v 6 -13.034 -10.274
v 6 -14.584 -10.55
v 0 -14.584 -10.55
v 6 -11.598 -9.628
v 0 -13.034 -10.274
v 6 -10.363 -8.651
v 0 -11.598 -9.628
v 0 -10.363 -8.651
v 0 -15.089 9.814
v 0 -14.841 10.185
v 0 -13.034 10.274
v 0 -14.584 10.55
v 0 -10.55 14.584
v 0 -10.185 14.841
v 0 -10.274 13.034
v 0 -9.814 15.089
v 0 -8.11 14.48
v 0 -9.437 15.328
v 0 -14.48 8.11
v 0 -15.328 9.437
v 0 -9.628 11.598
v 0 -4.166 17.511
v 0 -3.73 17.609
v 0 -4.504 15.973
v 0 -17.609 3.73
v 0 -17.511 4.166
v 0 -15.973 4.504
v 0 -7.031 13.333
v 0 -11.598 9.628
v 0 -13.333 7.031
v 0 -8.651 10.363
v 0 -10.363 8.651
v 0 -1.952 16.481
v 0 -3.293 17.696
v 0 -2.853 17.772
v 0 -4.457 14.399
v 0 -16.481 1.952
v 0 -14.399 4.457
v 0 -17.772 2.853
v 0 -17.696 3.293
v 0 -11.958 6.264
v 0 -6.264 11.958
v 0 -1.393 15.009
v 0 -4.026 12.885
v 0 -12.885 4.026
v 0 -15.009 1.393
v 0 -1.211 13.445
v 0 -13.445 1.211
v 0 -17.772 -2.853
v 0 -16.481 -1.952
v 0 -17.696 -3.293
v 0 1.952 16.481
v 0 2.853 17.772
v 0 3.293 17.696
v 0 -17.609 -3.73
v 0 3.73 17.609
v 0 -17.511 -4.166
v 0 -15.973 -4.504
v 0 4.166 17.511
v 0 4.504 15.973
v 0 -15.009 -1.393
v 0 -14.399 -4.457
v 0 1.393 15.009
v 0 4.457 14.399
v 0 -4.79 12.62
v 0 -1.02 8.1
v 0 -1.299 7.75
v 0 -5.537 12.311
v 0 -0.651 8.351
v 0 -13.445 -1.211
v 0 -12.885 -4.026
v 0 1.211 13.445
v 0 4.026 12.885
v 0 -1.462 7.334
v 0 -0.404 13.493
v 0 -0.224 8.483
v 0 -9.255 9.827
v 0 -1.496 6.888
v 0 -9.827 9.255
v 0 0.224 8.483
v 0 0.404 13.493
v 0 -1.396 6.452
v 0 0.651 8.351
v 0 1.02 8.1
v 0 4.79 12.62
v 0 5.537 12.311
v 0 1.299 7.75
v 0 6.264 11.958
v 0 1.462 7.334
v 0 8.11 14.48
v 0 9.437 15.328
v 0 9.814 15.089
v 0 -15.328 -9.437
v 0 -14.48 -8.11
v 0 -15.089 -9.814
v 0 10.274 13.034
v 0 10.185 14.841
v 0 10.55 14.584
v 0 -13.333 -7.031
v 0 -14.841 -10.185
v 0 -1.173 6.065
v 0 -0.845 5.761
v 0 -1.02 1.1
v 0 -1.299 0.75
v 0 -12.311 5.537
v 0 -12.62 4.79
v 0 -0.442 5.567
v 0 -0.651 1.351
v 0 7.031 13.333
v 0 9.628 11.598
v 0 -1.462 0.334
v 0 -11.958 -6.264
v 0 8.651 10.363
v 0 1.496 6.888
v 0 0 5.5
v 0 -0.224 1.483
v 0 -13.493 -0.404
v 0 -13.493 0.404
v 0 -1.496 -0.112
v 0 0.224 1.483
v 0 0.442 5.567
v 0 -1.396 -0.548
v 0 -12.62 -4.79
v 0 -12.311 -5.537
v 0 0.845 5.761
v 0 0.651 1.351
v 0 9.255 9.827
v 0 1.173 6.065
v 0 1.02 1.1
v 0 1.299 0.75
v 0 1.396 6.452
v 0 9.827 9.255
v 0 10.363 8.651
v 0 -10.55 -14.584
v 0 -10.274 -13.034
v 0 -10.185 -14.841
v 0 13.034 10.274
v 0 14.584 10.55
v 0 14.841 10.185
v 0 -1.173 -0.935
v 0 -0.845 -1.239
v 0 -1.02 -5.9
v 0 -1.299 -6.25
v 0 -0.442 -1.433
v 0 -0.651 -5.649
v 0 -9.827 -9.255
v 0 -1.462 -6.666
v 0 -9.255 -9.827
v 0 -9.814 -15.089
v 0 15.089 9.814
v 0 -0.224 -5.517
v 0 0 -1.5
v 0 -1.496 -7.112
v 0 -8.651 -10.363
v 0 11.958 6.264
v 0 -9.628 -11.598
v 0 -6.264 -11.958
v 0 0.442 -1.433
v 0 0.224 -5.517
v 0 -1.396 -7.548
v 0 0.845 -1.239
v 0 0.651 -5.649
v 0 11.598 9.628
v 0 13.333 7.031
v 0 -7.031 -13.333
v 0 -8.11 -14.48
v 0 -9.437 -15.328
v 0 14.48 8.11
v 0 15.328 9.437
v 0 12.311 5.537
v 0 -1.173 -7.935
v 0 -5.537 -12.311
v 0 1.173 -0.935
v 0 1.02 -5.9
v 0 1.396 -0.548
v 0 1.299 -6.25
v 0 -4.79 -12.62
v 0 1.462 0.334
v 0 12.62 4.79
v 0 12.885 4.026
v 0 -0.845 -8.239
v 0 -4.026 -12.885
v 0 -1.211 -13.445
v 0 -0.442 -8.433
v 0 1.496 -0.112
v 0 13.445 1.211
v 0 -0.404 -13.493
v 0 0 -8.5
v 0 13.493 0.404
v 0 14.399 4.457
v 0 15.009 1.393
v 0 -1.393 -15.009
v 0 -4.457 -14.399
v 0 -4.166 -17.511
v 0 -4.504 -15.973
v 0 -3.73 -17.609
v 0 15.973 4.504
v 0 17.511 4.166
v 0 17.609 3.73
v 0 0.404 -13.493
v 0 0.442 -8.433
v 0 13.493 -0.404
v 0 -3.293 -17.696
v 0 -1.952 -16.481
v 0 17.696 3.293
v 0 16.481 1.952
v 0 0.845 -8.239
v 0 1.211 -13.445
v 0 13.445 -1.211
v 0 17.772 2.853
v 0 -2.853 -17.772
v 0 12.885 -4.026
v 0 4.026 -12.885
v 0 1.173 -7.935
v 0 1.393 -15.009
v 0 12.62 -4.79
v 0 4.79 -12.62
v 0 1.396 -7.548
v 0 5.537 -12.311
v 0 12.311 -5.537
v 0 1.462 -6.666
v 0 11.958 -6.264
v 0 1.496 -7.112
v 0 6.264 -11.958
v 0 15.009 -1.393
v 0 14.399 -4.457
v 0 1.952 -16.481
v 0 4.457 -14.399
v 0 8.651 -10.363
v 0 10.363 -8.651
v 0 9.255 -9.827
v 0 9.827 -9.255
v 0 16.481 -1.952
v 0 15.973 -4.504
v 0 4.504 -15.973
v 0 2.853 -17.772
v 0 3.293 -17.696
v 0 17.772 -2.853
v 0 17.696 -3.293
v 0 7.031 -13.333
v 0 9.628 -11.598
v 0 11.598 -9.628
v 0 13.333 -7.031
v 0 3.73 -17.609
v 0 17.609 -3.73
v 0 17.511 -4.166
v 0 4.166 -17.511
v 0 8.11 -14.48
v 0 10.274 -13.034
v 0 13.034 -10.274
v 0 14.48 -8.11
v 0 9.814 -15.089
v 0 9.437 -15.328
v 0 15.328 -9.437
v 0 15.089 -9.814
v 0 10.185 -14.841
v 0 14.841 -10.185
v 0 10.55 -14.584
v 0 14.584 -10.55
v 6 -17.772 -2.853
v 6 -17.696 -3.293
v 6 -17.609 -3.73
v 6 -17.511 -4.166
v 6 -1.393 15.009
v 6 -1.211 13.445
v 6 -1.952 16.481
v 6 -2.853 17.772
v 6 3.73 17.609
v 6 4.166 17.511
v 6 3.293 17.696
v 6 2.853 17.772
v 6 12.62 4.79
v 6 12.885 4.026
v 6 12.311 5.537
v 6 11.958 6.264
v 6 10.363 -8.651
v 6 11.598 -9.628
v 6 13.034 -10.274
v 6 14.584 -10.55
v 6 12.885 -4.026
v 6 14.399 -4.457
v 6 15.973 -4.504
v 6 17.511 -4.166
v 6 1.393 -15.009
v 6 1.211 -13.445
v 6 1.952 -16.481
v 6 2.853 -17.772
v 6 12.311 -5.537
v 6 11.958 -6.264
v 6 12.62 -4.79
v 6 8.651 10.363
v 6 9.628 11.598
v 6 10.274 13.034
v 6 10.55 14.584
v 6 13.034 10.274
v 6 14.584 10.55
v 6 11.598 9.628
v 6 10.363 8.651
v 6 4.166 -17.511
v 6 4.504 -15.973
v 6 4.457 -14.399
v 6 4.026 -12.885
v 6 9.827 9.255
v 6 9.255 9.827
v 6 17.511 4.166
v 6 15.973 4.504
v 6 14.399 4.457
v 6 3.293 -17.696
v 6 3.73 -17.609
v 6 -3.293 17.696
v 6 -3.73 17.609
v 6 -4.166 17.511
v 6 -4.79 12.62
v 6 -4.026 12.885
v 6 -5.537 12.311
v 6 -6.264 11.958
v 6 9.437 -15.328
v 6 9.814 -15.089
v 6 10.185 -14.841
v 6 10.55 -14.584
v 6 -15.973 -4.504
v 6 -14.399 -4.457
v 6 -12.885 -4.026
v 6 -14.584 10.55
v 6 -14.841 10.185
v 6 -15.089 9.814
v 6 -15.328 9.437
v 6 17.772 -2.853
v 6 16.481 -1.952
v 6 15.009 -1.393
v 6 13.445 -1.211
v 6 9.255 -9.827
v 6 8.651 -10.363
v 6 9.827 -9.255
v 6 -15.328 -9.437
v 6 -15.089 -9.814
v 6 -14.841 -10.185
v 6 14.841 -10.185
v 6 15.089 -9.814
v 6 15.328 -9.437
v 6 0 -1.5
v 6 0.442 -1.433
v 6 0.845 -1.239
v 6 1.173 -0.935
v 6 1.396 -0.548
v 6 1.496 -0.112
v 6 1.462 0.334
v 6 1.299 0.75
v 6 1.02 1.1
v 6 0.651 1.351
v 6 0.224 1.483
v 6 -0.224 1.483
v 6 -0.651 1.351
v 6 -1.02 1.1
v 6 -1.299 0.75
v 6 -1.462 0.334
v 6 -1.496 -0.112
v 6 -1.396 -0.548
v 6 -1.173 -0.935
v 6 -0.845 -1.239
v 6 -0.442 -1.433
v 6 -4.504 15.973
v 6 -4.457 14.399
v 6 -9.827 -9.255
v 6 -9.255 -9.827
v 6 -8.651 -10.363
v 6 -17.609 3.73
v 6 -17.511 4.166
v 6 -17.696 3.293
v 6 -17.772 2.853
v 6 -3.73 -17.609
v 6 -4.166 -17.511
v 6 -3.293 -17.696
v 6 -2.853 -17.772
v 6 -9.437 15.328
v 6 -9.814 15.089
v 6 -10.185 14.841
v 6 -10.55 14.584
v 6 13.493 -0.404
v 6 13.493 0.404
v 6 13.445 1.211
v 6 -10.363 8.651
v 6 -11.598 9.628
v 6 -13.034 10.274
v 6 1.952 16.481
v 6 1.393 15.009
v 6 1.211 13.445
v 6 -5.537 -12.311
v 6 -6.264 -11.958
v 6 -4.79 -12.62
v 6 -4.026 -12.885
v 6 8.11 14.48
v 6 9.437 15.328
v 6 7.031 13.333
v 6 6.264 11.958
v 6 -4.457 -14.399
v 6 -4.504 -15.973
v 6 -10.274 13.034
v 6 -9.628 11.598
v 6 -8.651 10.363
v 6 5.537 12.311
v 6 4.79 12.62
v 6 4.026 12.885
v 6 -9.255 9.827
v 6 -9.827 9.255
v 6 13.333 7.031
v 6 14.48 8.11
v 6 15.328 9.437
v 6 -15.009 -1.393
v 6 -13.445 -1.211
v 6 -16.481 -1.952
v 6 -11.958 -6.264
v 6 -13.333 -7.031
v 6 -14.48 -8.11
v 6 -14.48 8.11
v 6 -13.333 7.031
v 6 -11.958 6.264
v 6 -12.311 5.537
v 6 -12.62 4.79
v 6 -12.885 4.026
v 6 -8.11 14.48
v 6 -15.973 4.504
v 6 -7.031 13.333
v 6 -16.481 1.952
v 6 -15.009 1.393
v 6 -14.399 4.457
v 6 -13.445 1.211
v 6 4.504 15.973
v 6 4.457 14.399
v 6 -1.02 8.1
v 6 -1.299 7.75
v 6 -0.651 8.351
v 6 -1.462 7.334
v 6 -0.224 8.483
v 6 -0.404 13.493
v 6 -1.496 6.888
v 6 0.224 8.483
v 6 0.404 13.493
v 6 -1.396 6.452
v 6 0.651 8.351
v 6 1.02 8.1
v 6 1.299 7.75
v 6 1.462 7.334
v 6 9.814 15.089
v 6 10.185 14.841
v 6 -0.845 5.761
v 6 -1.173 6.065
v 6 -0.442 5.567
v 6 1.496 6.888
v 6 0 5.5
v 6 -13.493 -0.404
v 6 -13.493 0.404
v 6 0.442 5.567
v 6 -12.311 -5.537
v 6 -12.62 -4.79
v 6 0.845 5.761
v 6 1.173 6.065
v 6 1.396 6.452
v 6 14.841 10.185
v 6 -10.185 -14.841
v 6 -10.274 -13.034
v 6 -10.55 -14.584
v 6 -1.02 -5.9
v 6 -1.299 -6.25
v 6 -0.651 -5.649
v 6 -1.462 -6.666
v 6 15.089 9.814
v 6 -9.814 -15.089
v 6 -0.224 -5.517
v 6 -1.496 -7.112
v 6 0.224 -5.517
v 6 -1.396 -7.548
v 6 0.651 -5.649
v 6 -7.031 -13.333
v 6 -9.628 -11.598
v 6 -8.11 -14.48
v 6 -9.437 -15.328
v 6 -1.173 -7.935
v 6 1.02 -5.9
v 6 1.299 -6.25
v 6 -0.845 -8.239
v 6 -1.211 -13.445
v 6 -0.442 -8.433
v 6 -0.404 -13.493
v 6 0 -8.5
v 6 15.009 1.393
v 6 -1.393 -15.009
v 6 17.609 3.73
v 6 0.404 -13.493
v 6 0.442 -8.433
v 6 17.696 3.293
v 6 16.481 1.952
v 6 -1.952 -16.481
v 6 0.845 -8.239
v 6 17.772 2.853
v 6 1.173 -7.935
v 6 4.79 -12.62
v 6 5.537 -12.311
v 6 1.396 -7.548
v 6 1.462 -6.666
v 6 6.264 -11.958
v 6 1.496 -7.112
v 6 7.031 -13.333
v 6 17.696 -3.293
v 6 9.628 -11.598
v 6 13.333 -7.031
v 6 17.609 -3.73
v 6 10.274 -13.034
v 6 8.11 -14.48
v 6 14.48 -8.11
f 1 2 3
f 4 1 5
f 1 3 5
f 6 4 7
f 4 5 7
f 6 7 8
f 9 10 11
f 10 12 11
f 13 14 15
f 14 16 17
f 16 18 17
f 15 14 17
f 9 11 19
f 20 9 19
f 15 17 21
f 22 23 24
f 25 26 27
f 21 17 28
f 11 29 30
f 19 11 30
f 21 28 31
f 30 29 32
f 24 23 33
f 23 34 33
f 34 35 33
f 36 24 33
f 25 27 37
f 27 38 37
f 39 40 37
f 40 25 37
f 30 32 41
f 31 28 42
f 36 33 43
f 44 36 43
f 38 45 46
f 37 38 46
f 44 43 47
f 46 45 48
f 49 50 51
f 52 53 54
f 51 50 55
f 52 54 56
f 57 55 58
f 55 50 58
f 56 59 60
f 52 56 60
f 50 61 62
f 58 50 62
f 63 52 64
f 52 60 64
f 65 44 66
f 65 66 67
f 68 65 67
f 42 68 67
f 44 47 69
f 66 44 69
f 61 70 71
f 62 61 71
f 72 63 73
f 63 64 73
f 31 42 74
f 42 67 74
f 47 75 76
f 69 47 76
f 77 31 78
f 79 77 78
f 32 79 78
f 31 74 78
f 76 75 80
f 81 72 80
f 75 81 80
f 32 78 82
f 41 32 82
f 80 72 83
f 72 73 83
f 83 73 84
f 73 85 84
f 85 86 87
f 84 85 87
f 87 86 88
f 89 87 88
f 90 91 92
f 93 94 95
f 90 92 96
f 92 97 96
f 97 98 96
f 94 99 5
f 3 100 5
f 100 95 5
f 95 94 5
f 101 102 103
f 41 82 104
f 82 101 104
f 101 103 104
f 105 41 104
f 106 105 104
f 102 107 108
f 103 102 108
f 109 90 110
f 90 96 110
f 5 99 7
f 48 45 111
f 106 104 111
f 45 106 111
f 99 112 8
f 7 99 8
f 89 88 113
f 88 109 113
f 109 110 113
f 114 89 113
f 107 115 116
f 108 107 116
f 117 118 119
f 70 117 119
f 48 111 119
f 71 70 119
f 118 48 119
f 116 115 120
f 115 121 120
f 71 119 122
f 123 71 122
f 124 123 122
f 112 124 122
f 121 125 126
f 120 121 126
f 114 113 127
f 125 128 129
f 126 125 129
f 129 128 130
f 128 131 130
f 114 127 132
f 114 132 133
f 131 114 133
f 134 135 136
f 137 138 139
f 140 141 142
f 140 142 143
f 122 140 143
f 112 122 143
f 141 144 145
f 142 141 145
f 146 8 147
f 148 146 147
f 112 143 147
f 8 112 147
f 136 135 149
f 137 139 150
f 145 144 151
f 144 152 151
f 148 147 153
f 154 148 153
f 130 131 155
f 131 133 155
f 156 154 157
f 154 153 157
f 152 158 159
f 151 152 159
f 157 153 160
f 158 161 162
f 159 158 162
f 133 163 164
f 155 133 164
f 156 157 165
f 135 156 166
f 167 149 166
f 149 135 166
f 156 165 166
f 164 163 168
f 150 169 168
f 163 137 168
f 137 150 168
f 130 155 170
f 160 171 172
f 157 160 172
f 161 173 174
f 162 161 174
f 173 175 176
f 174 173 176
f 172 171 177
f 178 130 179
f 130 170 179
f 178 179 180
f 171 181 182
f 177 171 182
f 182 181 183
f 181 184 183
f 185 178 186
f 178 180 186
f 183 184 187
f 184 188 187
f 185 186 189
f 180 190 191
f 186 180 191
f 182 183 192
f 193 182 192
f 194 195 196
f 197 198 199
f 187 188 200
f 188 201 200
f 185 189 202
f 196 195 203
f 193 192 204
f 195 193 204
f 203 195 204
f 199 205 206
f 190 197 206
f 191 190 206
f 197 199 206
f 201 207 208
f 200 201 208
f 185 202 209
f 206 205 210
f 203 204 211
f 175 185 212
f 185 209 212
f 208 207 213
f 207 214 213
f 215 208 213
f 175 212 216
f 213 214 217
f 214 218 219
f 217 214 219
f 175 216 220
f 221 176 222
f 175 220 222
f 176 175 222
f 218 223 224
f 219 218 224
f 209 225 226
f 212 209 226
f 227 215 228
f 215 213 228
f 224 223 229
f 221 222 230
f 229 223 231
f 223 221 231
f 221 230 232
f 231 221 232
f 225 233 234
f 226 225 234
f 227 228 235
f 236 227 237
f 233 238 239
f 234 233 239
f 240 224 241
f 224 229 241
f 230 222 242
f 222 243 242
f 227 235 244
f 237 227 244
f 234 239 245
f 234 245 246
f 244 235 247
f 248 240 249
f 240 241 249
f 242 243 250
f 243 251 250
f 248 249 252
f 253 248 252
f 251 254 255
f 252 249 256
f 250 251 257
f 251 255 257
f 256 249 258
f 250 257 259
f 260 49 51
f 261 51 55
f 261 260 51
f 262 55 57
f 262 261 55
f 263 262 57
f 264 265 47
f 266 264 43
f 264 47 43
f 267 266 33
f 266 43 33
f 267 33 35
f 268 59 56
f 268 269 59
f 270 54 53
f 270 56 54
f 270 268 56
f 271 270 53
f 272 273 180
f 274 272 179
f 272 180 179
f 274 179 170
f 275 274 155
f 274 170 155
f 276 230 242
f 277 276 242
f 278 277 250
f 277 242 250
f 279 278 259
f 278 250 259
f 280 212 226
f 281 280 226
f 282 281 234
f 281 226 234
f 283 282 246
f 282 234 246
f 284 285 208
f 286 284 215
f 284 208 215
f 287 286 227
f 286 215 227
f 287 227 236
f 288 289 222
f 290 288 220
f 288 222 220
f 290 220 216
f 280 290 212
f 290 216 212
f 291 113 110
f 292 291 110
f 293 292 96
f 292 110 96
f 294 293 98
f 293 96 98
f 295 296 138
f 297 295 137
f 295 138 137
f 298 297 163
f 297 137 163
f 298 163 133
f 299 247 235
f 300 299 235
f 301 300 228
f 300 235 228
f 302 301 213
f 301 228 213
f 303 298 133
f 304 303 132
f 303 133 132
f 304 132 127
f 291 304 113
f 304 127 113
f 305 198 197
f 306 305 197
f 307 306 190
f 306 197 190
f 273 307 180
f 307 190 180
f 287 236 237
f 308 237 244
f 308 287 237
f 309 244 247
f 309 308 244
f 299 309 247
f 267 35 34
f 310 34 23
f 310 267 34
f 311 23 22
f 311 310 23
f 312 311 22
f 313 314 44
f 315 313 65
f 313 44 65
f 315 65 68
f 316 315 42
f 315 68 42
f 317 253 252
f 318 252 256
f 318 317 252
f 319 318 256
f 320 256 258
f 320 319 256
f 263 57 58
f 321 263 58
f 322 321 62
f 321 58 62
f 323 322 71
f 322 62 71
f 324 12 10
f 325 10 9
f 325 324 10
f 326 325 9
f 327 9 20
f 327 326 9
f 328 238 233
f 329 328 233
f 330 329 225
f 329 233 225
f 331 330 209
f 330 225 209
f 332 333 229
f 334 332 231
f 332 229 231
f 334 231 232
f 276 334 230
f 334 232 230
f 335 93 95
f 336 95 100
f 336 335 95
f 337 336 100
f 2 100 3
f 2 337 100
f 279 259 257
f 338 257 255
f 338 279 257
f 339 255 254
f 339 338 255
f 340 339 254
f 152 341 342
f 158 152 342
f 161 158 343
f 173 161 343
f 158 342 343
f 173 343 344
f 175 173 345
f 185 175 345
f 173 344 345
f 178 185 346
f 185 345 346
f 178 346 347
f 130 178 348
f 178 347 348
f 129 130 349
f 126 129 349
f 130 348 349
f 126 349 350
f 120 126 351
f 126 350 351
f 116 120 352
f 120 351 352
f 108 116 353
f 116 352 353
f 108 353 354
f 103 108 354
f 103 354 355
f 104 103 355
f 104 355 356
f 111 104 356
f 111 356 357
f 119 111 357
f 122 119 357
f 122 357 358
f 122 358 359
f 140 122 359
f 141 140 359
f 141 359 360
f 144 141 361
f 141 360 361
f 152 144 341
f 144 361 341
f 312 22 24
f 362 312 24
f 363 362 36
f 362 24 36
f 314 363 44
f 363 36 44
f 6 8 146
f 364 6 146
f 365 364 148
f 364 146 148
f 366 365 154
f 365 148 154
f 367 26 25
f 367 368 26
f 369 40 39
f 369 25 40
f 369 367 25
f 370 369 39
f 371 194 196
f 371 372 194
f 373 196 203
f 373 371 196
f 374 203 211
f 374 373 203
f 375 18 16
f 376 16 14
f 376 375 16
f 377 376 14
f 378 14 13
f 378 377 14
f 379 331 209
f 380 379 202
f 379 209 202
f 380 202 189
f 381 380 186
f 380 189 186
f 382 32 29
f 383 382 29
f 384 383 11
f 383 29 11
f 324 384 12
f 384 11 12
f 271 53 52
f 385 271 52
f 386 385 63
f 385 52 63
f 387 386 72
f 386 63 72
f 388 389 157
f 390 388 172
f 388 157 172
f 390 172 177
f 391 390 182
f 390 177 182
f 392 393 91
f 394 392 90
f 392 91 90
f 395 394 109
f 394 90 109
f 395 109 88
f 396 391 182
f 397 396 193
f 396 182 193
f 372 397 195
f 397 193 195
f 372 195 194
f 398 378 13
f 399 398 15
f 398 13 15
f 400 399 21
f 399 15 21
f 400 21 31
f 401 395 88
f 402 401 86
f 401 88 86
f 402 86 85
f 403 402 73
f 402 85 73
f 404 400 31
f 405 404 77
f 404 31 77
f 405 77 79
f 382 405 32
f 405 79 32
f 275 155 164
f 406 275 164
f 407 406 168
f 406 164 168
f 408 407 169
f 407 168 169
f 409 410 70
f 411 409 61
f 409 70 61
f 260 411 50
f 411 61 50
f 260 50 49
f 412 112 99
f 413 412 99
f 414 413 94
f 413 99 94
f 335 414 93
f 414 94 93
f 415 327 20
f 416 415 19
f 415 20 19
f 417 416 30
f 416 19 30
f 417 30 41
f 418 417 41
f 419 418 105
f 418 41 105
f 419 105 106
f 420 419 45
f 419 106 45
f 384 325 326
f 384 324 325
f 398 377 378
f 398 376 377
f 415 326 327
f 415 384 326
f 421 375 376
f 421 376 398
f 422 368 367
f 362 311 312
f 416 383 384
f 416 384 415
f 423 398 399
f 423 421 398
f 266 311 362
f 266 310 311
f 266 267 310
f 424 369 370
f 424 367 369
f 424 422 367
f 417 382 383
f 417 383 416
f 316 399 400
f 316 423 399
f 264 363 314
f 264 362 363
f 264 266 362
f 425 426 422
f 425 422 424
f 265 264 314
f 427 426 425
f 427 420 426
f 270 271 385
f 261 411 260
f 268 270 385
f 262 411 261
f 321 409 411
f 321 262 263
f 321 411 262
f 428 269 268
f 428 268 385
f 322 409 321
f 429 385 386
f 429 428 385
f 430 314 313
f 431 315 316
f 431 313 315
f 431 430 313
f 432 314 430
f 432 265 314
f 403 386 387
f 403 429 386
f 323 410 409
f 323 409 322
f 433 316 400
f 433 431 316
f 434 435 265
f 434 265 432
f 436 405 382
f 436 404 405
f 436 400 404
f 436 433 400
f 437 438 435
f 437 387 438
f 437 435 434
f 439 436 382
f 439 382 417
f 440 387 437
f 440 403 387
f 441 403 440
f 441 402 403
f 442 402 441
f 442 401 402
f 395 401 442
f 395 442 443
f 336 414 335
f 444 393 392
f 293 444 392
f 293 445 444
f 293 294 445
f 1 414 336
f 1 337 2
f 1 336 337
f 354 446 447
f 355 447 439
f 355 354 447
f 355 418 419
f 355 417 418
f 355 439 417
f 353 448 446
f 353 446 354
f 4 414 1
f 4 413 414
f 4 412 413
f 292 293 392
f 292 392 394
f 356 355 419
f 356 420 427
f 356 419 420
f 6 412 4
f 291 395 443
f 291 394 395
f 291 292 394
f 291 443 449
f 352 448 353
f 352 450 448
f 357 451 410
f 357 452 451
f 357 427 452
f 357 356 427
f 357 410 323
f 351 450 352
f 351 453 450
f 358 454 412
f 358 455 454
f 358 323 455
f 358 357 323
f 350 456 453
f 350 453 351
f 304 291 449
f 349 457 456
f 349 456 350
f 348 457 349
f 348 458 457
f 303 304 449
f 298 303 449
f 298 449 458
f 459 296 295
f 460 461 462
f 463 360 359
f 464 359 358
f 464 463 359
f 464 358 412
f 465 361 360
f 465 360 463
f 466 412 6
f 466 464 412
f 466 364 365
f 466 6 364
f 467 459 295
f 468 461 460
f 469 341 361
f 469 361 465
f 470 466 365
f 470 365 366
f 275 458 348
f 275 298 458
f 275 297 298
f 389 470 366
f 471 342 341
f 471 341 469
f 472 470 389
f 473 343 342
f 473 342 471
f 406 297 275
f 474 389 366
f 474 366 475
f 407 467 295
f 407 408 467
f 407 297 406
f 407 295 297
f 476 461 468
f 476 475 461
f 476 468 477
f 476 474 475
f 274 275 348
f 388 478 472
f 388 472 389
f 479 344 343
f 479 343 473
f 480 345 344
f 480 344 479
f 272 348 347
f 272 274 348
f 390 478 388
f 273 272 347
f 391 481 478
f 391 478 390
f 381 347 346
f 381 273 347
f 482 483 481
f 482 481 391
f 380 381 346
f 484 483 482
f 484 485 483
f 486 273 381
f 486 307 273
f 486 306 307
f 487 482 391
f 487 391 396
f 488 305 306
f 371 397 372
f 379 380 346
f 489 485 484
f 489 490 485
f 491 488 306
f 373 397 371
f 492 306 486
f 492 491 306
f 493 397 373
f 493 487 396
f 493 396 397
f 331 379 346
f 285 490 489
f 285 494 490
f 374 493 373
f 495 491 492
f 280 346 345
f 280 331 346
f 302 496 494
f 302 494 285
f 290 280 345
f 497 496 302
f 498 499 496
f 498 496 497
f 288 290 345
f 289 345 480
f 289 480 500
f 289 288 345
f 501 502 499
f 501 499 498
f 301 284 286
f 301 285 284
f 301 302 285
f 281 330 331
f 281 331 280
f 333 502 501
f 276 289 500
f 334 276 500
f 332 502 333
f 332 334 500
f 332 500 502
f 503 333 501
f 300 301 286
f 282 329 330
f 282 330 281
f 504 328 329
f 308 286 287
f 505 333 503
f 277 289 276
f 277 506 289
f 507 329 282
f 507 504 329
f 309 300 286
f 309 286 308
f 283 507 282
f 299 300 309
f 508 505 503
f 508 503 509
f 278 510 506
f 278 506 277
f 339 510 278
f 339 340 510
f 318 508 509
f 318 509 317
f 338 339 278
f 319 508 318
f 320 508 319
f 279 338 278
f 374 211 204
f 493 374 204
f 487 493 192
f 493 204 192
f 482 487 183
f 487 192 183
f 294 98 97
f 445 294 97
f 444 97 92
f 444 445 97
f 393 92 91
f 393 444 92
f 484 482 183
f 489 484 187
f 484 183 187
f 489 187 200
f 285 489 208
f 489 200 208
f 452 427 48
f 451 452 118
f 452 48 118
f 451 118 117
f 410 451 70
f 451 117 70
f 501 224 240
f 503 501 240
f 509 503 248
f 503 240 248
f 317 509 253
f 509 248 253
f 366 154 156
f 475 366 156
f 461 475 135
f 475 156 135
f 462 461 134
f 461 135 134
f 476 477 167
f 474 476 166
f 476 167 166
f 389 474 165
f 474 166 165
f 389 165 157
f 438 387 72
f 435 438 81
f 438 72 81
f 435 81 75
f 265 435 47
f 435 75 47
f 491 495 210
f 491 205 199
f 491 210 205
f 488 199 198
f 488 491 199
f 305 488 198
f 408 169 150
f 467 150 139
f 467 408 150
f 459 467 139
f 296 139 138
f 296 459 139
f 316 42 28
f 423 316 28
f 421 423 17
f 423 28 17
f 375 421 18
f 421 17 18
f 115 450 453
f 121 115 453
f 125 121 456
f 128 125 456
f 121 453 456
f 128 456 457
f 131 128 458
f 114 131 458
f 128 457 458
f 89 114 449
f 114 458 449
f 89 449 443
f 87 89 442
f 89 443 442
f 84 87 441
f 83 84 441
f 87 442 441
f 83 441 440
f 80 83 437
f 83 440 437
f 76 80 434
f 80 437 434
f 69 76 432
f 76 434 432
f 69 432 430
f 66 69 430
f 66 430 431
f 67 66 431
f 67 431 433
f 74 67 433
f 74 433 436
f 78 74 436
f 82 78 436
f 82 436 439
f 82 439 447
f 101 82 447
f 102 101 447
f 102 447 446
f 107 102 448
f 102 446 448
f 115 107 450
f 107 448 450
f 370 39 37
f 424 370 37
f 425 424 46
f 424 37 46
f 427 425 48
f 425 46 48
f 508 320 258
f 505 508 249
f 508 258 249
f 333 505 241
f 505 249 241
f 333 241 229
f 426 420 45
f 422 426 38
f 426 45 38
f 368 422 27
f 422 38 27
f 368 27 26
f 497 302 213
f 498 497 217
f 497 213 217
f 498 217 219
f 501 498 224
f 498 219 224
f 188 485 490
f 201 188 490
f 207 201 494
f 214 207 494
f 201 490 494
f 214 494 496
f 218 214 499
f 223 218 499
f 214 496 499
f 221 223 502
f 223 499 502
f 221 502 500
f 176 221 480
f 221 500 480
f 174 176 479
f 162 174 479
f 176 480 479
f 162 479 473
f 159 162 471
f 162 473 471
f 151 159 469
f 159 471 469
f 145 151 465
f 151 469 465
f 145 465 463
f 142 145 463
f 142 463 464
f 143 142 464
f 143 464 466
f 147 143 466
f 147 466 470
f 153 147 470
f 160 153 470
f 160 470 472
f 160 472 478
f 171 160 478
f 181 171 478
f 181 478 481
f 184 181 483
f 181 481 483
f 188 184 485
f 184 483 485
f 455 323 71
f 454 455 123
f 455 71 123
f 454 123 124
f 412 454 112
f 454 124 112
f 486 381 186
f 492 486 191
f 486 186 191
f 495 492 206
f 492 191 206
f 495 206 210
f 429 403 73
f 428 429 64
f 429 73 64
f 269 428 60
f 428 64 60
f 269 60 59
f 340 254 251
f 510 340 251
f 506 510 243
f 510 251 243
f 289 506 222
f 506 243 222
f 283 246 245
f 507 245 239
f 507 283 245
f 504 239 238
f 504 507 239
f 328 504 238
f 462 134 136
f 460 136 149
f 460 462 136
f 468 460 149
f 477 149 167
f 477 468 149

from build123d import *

# Parameters (mm, degrees)
BASPROSKE_W             = 6
BASPROSKE_H             = 18
TOOTHCUT_DEPTH          = 27.153393661
TEETHCUTS_COUNT         = 16
TEETHCUTS_ANGLE         = 337.5
BORSKE_R                = 4
BORE_DEPTH              = 50.0000508
CROQUIS1_R              = 4
CROQUIS1_R_2            = 1.5
SALIENTE_EXTRUIR1_DEPTH = 6
CROQUIS2_R              = 1.5
CORTAR_EXTRUIR1_DEPTH   = 6


with BuildPart() as part:
    # BasProSke → Base-Revolve (revolve)
    with BuildSketch(Plane(origin=(0, 0, 0), x_dir=(1, 0, 0), z_dir=(0, 1, 0)), mode=Mode.PRIVATE) as base_revolve_sk:
        with Locations((3, 9)):
            Rectangle(BASPROSKE_W, BASPROSKE_H)
    revolve(base_revolve_sk.sketch.rotate(Axis((-10, 0, 0), (1, 0, 0)), 180), axis=Axis((-10, 0, 0), (1, 0, 0)))

    # TooCutSke → ToothCut (cut, through all)
    with BuildSketch(Plane(origin=(0, 0, 0), x_dir=(0, 0, -1), z_dir=(1, 0, 0))):
        with BuildLine():
            ThreePointArc((1.210794474, 13.444589162), (0, 13.499), (-1.210794474, 13.444589162))
            ThreePointArc((-1.210794474, 13.444589162), (-1.632237109, 15.776340848), (-2.873179402, 17.794939879))
            ThreePointArc((-2.873179402, 17.794939879), (0, 18.0254), (2.873179402, 17.794939879))
            ThreePointArc((2.873179402, 17.794939879), (1.632237109, 15.776340848), (1.210794474, 13.444589162))
        make_face()
    toothcut = extrude(amount=TOOTHCUT_DEPTH, mode=Mode.SUBTRACT)

    # TeethCuts: ToothCut ×16 about axis
    teethcuts_axis = Axis((-10, 0, 0), (1, 0, 0))
    for i in range(1, TEETHCUTS_COUNT):
        add(toothcut.rotate(teethcuts_axis, i * TEETHCUTS_ANGLE / (TEETHCUTS_COUNT - 1)), mode=Mode.SUBTRACT)

    # BorSke → Bore (cut, symmetric)
    with BuildSketch(Plane(origin=(0, 0, 0), x_dir=(0, 0, -1), z_dir=(1, 0, 0))):
        with Locations(Location((0, 0, 0), (0, 0, 180))):
            Circle(BORSKE_R)
    extrude(amount=BORE_DEPTH, both=True, mode=Mode.SUBTRACT)

    # Croquis1 → Saliente-Extruir1 (add)
    with BuildSketch(Plane(origin=(6, 0, 0), x_dir=(0, 0, -1), z_dir=(1, 0, 0))):
        Circle(CROQUIS1_R)
        Circle(CROQUIS1_R_2, mode=Mode.SUBTRACT)
    extrude(amount=-SALIENTE_EXTRUIR1_DEPTH)

    # Croquis2 → Cortar-Extruir1 (cut)
    with BuildSketch(Plane(origin=(6, 0, 0), x_dir=(0, 0, -1), z_dir=(1, 0, 0))):
        with Locations((-7, 0)):
            Circle(CROQUIS2_R)
        with Locations((7, 0)):
            Circle(CROQUIS2_R)
    extrude(amount=-CORTAR_EXTRUIR1_DEPTH, mode=Mode.SUBTRACT)


solid = part.part
